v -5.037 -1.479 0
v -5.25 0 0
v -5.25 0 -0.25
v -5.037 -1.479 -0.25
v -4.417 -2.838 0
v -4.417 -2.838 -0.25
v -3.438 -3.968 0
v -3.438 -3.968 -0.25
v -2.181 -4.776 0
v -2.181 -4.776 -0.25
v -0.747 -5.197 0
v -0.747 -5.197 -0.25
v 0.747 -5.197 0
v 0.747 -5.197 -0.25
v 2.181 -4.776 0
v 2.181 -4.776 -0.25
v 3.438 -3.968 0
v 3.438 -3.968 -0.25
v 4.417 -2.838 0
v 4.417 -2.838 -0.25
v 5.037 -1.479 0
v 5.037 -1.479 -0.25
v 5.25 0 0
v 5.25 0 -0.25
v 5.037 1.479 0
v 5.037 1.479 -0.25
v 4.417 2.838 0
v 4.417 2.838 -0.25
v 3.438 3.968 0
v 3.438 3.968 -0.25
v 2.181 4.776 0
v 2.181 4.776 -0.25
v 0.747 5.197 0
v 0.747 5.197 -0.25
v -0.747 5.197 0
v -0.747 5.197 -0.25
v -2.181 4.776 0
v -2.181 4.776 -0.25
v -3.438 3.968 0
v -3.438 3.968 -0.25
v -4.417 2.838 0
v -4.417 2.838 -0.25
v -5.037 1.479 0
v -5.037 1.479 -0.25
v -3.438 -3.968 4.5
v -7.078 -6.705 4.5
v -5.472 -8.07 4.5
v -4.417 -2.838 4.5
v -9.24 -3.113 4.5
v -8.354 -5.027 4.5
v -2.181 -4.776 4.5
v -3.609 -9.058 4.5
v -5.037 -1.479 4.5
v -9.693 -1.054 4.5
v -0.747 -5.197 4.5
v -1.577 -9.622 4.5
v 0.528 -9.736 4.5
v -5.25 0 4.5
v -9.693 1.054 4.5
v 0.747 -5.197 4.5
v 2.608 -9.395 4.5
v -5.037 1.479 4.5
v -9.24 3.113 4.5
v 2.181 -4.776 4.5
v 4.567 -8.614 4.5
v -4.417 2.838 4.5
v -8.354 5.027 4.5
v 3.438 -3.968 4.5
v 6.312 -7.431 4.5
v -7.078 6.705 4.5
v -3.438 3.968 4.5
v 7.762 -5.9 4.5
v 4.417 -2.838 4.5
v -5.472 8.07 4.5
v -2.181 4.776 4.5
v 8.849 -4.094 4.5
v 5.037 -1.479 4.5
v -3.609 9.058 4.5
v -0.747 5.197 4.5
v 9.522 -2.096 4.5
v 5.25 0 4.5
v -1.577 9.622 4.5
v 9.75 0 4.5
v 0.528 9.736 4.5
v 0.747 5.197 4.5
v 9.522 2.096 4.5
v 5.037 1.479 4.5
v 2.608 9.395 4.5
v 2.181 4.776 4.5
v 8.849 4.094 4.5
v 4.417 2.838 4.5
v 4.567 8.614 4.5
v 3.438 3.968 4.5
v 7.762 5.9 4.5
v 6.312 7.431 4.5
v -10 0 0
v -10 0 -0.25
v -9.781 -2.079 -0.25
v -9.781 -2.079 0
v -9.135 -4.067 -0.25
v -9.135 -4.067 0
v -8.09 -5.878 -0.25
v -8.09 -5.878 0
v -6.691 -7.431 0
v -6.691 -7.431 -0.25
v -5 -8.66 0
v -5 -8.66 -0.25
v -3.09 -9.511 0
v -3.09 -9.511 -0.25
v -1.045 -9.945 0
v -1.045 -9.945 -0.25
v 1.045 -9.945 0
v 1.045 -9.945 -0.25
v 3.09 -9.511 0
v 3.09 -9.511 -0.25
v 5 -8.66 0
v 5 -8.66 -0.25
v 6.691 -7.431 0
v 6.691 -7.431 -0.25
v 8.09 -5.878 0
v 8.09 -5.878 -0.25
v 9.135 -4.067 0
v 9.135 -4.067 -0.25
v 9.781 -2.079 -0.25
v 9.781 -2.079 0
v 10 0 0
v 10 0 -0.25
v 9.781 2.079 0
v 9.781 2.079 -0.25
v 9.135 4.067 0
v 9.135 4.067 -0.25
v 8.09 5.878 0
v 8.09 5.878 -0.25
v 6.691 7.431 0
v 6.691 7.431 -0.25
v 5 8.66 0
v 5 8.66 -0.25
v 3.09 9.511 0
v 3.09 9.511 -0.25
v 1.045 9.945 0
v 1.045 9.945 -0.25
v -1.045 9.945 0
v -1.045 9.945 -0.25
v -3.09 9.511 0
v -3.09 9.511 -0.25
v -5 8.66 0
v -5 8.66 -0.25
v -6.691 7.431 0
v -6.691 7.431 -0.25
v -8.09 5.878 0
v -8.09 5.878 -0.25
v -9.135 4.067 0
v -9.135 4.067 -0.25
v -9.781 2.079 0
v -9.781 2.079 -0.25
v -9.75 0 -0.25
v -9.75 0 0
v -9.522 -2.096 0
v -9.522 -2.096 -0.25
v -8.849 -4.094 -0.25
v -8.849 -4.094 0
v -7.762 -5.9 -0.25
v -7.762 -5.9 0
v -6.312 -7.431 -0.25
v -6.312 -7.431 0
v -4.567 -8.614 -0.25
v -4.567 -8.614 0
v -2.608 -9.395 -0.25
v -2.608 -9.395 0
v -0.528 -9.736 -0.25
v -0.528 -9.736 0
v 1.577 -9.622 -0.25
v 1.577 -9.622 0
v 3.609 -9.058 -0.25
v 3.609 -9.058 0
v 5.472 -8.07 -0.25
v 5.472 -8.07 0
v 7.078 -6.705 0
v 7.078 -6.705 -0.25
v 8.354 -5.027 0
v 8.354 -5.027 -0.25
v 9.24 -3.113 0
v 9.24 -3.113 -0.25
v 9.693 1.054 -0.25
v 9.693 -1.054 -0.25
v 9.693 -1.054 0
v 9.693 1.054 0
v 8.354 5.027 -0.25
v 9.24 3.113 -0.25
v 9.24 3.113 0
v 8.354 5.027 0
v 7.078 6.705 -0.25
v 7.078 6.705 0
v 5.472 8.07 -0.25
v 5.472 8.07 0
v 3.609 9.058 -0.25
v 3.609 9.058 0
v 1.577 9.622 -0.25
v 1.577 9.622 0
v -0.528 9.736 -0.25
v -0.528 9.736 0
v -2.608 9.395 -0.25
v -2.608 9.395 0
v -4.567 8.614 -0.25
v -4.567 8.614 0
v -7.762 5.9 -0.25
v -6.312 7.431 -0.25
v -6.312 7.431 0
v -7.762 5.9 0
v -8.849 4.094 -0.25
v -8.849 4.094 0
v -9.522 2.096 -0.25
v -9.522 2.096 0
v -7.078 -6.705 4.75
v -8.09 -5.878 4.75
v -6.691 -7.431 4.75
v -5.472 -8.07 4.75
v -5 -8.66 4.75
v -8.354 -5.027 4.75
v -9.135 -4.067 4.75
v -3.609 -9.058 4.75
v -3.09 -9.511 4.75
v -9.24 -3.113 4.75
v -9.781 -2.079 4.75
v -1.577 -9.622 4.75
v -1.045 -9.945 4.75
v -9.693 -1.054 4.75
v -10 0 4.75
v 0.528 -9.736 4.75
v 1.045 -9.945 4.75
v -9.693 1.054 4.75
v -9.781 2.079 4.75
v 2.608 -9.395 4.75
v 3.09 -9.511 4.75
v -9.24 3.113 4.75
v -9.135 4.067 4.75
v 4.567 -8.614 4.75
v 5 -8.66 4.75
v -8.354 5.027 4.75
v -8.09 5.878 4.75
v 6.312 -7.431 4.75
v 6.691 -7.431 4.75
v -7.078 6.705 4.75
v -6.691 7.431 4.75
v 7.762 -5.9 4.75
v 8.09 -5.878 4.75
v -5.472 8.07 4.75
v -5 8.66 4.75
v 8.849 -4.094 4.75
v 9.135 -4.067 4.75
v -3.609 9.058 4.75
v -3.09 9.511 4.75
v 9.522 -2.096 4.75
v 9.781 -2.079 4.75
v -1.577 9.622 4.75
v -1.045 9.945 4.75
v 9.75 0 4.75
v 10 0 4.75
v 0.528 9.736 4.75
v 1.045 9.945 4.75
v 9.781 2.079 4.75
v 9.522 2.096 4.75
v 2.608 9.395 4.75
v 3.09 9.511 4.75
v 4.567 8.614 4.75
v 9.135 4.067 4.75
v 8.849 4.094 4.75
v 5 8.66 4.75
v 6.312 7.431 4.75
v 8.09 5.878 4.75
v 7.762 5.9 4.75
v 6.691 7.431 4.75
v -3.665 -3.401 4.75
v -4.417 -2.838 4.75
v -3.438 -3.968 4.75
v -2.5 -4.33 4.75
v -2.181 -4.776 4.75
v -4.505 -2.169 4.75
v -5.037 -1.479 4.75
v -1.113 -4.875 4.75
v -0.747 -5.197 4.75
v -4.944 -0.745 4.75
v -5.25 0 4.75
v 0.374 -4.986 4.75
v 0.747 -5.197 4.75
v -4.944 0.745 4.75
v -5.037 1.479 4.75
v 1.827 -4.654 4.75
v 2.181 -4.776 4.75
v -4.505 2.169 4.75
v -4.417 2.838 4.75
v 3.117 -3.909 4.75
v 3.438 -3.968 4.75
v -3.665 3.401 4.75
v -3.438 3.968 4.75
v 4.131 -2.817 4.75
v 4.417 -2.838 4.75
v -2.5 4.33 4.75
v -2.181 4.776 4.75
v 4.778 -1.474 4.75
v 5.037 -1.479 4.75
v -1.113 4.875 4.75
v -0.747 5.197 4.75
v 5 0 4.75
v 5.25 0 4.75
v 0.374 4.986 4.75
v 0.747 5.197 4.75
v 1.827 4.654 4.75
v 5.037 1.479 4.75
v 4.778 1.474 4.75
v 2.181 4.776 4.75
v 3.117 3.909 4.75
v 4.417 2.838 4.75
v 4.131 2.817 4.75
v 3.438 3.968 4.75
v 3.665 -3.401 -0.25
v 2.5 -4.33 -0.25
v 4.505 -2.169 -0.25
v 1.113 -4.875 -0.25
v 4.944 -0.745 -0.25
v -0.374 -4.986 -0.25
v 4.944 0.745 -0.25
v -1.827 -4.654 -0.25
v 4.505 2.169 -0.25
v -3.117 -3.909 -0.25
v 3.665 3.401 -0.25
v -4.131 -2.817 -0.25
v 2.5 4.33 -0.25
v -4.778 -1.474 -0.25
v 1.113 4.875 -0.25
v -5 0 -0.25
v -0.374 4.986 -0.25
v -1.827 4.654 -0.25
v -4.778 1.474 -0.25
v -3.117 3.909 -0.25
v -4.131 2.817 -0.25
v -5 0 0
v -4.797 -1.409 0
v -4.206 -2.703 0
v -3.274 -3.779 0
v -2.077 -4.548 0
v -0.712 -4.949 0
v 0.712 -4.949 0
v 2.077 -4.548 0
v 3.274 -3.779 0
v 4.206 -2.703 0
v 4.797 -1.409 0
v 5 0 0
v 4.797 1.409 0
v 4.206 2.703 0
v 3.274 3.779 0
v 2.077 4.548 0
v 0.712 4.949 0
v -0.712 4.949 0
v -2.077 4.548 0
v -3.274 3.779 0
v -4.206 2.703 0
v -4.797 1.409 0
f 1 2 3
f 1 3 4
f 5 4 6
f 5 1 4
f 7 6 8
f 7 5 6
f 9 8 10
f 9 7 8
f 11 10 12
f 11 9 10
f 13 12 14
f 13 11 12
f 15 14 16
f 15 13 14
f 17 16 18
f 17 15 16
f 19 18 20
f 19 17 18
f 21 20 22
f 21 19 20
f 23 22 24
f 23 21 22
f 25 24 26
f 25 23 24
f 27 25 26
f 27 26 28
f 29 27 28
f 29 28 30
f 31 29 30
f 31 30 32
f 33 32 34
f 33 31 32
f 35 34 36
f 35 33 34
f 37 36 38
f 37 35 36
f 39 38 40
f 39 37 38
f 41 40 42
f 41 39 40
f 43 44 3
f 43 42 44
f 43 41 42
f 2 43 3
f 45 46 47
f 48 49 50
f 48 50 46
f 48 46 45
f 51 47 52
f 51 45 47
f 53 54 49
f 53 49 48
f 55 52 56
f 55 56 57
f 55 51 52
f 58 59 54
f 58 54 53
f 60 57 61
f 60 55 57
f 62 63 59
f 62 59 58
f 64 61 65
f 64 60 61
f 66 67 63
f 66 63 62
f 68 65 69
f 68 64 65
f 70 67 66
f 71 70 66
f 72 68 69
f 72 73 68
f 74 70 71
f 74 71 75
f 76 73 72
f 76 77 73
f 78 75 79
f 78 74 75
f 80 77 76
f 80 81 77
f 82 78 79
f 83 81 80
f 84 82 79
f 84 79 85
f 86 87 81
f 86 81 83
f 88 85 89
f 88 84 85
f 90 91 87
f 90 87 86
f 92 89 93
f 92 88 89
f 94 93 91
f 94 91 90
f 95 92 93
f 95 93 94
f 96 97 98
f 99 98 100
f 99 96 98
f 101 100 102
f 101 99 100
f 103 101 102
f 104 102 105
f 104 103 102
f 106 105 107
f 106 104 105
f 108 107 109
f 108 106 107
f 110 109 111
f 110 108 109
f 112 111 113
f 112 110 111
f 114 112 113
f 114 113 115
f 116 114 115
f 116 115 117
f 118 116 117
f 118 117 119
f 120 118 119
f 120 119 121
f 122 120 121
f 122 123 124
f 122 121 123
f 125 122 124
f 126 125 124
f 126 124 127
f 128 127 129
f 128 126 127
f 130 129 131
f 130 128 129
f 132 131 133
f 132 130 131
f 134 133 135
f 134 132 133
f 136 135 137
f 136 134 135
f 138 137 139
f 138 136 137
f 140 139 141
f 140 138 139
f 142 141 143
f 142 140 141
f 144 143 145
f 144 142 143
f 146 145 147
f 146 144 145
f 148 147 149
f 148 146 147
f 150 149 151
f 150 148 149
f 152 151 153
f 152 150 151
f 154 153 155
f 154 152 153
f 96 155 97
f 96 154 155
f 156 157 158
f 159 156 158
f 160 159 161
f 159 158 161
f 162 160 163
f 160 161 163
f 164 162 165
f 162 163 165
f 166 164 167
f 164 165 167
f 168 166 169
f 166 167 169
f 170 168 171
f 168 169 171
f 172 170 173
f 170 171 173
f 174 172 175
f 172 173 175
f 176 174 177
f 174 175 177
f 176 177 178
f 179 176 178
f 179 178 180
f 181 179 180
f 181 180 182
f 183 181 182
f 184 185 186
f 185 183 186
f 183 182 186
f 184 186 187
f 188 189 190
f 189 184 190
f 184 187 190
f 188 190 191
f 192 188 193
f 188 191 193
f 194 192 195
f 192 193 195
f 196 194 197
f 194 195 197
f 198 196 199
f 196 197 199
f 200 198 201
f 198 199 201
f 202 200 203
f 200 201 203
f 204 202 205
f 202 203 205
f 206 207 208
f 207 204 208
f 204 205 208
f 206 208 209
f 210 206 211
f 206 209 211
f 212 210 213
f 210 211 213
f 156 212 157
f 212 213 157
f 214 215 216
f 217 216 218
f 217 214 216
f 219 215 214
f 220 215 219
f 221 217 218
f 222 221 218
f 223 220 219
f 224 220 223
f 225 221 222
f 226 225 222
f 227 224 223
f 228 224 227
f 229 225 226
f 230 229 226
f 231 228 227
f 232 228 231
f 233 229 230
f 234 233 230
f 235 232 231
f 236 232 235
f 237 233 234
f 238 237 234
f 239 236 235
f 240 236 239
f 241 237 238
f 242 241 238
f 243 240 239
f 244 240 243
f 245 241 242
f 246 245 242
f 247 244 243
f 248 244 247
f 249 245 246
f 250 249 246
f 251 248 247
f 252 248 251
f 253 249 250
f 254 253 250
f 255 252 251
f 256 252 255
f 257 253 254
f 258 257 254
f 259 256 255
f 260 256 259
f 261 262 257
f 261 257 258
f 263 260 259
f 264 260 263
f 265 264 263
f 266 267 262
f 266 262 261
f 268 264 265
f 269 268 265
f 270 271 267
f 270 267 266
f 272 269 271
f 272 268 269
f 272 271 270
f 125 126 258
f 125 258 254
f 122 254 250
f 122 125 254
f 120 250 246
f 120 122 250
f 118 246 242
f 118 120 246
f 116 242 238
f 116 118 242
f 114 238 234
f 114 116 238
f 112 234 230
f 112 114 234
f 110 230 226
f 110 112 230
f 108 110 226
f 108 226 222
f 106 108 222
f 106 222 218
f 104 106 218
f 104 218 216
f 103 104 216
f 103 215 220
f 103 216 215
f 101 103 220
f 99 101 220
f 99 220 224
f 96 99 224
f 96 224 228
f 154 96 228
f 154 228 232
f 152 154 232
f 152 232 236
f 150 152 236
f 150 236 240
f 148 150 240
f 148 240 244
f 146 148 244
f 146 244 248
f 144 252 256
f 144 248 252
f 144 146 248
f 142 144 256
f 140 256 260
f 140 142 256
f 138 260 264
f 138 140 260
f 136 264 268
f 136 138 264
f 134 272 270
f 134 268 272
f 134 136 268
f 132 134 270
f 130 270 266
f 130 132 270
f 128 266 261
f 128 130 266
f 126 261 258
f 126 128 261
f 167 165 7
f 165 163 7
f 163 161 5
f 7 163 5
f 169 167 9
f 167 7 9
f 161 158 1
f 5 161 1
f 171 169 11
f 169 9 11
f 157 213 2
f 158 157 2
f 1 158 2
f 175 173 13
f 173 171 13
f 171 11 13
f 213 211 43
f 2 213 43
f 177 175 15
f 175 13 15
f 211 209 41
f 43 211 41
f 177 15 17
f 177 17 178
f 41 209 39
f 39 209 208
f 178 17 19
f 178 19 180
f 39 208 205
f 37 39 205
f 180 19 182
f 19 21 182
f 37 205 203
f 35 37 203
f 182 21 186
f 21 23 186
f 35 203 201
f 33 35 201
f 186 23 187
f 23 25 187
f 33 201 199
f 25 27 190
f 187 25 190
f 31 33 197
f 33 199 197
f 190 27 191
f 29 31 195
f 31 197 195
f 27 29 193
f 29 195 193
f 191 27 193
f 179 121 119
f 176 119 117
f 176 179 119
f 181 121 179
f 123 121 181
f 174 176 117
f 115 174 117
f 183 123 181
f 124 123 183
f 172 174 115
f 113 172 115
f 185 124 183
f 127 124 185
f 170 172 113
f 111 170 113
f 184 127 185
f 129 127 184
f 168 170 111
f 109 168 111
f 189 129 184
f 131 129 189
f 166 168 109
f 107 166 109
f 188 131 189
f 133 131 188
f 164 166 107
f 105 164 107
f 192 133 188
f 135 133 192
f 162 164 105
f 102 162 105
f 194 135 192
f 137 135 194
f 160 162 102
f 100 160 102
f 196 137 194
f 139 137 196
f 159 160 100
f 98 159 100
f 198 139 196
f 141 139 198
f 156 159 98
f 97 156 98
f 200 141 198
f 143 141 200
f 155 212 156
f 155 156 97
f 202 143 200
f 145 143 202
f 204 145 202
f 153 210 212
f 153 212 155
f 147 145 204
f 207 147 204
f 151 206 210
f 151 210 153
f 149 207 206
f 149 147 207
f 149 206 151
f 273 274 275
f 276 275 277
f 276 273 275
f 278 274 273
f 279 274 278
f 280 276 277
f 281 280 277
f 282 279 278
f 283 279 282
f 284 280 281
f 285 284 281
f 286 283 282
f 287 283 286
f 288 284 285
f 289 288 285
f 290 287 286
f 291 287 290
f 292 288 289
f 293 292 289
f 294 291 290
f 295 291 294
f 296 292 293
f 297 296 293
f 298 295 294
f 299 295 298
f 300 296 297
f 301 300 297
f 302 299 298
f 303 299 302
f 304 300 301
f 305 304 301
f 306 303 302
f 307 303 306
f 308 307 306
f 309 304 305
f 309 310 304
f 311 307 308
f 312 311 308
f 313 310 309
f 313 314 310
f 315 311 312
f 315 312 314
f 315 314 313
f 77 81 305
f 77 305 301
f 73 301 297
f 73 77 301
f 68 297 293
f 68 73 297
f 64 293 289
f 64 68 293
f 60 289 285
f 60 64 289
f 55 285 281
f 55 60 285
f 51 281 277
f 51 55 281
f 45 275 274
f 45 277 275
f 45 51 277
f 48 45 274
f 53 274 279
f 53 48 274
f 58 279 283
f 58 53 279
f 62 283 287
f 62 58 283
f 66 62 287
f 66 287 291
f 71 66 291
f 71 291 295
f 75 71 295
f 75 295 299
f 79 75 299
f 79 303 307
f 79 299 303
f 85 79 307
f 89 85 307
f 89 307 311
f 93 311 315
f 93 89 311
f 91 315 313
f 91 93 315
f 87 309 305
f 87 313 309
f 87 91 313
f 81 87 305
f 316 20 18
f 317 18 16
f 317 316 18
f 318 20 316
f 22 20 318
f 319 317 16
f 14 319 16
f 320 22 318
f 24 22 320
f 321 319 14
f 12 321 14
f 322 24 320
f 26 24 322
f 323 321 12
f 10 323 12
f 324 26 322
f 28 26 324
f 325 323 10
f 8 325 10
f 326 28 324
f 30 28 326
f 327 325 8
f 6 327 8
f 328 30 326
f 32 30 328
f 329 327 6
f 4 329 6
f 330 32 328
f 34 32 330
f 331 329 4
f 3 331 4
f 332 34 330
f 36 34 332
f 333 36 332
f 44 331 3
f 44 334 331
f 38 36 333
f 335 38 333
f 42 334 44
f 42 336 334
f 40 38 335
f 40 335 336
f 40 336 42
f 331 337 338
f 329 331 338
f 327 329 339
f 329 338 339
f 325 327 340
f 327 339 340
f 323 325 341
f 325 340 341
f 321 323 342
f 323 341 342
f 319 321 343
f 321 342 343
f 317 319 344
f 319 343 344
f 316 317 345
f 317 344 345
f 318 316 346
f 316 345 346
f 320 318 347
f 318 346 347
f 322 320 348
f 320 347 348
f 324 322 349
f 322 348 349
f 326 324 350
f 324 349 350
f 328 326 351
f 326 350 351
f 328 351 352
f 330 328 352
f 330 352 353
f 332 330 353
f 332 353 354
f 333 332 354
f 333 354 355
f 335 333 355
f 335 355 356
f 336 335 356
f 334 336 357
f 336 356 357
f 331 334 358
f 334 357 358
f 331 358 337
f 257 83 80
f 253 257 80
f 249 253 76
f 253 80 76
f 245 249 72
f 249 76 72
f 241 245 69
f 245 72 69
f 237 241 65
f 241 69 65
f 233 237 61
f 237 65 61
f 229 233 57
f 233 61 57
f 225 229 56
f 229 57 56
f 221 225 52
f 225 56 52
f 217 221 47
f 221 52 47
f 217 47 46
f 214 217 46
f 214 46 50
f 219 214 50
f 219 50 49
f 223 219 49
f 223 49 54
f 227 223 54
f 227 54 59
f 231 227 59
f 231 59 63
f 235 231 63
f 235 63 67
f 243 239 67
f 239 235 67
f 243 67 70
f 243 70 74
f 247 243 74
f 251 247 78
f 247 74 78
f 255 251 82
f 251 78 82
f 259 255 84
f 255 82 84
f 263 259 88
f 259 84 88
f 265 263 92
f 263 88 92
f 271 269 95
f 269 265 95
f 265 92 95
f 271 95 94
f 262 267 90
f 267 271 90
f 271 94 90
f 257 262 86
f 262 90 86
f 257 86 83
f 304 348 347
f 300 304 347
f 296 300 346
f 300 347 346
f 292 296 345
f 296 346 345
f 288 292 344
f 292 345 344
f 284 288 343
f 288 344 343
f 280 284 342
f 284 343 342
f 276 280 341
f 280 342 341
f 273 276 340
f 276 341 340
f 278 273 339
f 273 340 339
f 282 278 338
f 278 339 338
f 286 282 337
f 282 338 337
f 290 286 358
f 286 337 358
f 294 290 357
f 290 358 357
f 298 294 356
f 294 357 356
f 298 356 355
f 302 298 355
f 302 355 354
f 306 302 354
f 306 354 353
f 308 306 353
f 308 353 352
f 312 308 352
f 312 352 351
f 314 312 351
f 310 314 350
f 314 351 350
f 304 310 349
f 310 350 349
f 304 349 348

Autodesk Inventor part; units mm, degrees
ref_plane "YZ Plane" through (0, 0, 0) normal (1, 0, 0) x (0, 1, 0)
ref_plane "XZ Plane" through (0, 0, 0) normal (0, 1, 0) x (-1, 0, 0)
ref_plane "XY Plane" through (0, 0, 0) normal (0, 0, 1) x (1, 0, 0)
sketch "Sketch1" plane through (0, 0, 0) normal (0, 0, 1) x (1, 0, 0)
  circle A0 centre (0, 0) radius 5
  circle A1 centre (0, 0) radius 10
  dimension "d0" = 10
  dimension "d1" = 20
extrude "Extrusion1" add sketch "Sketch1" along normal blind 4.5
sketch "Sketch2" plane through (0, 0, 4.5) normal (0, 0, 1) x (1, 0, 0)
  circle A0 centre (0, 0) radius 10
  circle A1 centre (0, 0) radius 9.75
  circle A2 centre (0, 0) radius 5
  circle A3 centre (0, 0) radius 5.25
  dimension "d4" = 19.5
  dimension "d5" = 10
  dimension "d6" = 10.5
extrude "Extrusion2" add sketch "Sketch2" along normal blind 0.25
sketch "Sketch3" plane through (0, 0, 0) normal (0, 0, -1) x (-1, 0, 0)
  circle A0 centre (0, 0) radius 10
  circle A1 centre (0, 0) radius 9.75
  circle A2 centre (0, 0) radius 5
  circle A3 centre (0, 0) radius 5.25
  dimension "d9" = 20
  dimension "d10" = 19.5
  dimension "d11" = 10
  dimension "d12" = 10.5
extrude "Extrusion3" add sketch "Sketch3" along normal blind 0.25
properties part number "bearing" material "Aluminum 6061"
